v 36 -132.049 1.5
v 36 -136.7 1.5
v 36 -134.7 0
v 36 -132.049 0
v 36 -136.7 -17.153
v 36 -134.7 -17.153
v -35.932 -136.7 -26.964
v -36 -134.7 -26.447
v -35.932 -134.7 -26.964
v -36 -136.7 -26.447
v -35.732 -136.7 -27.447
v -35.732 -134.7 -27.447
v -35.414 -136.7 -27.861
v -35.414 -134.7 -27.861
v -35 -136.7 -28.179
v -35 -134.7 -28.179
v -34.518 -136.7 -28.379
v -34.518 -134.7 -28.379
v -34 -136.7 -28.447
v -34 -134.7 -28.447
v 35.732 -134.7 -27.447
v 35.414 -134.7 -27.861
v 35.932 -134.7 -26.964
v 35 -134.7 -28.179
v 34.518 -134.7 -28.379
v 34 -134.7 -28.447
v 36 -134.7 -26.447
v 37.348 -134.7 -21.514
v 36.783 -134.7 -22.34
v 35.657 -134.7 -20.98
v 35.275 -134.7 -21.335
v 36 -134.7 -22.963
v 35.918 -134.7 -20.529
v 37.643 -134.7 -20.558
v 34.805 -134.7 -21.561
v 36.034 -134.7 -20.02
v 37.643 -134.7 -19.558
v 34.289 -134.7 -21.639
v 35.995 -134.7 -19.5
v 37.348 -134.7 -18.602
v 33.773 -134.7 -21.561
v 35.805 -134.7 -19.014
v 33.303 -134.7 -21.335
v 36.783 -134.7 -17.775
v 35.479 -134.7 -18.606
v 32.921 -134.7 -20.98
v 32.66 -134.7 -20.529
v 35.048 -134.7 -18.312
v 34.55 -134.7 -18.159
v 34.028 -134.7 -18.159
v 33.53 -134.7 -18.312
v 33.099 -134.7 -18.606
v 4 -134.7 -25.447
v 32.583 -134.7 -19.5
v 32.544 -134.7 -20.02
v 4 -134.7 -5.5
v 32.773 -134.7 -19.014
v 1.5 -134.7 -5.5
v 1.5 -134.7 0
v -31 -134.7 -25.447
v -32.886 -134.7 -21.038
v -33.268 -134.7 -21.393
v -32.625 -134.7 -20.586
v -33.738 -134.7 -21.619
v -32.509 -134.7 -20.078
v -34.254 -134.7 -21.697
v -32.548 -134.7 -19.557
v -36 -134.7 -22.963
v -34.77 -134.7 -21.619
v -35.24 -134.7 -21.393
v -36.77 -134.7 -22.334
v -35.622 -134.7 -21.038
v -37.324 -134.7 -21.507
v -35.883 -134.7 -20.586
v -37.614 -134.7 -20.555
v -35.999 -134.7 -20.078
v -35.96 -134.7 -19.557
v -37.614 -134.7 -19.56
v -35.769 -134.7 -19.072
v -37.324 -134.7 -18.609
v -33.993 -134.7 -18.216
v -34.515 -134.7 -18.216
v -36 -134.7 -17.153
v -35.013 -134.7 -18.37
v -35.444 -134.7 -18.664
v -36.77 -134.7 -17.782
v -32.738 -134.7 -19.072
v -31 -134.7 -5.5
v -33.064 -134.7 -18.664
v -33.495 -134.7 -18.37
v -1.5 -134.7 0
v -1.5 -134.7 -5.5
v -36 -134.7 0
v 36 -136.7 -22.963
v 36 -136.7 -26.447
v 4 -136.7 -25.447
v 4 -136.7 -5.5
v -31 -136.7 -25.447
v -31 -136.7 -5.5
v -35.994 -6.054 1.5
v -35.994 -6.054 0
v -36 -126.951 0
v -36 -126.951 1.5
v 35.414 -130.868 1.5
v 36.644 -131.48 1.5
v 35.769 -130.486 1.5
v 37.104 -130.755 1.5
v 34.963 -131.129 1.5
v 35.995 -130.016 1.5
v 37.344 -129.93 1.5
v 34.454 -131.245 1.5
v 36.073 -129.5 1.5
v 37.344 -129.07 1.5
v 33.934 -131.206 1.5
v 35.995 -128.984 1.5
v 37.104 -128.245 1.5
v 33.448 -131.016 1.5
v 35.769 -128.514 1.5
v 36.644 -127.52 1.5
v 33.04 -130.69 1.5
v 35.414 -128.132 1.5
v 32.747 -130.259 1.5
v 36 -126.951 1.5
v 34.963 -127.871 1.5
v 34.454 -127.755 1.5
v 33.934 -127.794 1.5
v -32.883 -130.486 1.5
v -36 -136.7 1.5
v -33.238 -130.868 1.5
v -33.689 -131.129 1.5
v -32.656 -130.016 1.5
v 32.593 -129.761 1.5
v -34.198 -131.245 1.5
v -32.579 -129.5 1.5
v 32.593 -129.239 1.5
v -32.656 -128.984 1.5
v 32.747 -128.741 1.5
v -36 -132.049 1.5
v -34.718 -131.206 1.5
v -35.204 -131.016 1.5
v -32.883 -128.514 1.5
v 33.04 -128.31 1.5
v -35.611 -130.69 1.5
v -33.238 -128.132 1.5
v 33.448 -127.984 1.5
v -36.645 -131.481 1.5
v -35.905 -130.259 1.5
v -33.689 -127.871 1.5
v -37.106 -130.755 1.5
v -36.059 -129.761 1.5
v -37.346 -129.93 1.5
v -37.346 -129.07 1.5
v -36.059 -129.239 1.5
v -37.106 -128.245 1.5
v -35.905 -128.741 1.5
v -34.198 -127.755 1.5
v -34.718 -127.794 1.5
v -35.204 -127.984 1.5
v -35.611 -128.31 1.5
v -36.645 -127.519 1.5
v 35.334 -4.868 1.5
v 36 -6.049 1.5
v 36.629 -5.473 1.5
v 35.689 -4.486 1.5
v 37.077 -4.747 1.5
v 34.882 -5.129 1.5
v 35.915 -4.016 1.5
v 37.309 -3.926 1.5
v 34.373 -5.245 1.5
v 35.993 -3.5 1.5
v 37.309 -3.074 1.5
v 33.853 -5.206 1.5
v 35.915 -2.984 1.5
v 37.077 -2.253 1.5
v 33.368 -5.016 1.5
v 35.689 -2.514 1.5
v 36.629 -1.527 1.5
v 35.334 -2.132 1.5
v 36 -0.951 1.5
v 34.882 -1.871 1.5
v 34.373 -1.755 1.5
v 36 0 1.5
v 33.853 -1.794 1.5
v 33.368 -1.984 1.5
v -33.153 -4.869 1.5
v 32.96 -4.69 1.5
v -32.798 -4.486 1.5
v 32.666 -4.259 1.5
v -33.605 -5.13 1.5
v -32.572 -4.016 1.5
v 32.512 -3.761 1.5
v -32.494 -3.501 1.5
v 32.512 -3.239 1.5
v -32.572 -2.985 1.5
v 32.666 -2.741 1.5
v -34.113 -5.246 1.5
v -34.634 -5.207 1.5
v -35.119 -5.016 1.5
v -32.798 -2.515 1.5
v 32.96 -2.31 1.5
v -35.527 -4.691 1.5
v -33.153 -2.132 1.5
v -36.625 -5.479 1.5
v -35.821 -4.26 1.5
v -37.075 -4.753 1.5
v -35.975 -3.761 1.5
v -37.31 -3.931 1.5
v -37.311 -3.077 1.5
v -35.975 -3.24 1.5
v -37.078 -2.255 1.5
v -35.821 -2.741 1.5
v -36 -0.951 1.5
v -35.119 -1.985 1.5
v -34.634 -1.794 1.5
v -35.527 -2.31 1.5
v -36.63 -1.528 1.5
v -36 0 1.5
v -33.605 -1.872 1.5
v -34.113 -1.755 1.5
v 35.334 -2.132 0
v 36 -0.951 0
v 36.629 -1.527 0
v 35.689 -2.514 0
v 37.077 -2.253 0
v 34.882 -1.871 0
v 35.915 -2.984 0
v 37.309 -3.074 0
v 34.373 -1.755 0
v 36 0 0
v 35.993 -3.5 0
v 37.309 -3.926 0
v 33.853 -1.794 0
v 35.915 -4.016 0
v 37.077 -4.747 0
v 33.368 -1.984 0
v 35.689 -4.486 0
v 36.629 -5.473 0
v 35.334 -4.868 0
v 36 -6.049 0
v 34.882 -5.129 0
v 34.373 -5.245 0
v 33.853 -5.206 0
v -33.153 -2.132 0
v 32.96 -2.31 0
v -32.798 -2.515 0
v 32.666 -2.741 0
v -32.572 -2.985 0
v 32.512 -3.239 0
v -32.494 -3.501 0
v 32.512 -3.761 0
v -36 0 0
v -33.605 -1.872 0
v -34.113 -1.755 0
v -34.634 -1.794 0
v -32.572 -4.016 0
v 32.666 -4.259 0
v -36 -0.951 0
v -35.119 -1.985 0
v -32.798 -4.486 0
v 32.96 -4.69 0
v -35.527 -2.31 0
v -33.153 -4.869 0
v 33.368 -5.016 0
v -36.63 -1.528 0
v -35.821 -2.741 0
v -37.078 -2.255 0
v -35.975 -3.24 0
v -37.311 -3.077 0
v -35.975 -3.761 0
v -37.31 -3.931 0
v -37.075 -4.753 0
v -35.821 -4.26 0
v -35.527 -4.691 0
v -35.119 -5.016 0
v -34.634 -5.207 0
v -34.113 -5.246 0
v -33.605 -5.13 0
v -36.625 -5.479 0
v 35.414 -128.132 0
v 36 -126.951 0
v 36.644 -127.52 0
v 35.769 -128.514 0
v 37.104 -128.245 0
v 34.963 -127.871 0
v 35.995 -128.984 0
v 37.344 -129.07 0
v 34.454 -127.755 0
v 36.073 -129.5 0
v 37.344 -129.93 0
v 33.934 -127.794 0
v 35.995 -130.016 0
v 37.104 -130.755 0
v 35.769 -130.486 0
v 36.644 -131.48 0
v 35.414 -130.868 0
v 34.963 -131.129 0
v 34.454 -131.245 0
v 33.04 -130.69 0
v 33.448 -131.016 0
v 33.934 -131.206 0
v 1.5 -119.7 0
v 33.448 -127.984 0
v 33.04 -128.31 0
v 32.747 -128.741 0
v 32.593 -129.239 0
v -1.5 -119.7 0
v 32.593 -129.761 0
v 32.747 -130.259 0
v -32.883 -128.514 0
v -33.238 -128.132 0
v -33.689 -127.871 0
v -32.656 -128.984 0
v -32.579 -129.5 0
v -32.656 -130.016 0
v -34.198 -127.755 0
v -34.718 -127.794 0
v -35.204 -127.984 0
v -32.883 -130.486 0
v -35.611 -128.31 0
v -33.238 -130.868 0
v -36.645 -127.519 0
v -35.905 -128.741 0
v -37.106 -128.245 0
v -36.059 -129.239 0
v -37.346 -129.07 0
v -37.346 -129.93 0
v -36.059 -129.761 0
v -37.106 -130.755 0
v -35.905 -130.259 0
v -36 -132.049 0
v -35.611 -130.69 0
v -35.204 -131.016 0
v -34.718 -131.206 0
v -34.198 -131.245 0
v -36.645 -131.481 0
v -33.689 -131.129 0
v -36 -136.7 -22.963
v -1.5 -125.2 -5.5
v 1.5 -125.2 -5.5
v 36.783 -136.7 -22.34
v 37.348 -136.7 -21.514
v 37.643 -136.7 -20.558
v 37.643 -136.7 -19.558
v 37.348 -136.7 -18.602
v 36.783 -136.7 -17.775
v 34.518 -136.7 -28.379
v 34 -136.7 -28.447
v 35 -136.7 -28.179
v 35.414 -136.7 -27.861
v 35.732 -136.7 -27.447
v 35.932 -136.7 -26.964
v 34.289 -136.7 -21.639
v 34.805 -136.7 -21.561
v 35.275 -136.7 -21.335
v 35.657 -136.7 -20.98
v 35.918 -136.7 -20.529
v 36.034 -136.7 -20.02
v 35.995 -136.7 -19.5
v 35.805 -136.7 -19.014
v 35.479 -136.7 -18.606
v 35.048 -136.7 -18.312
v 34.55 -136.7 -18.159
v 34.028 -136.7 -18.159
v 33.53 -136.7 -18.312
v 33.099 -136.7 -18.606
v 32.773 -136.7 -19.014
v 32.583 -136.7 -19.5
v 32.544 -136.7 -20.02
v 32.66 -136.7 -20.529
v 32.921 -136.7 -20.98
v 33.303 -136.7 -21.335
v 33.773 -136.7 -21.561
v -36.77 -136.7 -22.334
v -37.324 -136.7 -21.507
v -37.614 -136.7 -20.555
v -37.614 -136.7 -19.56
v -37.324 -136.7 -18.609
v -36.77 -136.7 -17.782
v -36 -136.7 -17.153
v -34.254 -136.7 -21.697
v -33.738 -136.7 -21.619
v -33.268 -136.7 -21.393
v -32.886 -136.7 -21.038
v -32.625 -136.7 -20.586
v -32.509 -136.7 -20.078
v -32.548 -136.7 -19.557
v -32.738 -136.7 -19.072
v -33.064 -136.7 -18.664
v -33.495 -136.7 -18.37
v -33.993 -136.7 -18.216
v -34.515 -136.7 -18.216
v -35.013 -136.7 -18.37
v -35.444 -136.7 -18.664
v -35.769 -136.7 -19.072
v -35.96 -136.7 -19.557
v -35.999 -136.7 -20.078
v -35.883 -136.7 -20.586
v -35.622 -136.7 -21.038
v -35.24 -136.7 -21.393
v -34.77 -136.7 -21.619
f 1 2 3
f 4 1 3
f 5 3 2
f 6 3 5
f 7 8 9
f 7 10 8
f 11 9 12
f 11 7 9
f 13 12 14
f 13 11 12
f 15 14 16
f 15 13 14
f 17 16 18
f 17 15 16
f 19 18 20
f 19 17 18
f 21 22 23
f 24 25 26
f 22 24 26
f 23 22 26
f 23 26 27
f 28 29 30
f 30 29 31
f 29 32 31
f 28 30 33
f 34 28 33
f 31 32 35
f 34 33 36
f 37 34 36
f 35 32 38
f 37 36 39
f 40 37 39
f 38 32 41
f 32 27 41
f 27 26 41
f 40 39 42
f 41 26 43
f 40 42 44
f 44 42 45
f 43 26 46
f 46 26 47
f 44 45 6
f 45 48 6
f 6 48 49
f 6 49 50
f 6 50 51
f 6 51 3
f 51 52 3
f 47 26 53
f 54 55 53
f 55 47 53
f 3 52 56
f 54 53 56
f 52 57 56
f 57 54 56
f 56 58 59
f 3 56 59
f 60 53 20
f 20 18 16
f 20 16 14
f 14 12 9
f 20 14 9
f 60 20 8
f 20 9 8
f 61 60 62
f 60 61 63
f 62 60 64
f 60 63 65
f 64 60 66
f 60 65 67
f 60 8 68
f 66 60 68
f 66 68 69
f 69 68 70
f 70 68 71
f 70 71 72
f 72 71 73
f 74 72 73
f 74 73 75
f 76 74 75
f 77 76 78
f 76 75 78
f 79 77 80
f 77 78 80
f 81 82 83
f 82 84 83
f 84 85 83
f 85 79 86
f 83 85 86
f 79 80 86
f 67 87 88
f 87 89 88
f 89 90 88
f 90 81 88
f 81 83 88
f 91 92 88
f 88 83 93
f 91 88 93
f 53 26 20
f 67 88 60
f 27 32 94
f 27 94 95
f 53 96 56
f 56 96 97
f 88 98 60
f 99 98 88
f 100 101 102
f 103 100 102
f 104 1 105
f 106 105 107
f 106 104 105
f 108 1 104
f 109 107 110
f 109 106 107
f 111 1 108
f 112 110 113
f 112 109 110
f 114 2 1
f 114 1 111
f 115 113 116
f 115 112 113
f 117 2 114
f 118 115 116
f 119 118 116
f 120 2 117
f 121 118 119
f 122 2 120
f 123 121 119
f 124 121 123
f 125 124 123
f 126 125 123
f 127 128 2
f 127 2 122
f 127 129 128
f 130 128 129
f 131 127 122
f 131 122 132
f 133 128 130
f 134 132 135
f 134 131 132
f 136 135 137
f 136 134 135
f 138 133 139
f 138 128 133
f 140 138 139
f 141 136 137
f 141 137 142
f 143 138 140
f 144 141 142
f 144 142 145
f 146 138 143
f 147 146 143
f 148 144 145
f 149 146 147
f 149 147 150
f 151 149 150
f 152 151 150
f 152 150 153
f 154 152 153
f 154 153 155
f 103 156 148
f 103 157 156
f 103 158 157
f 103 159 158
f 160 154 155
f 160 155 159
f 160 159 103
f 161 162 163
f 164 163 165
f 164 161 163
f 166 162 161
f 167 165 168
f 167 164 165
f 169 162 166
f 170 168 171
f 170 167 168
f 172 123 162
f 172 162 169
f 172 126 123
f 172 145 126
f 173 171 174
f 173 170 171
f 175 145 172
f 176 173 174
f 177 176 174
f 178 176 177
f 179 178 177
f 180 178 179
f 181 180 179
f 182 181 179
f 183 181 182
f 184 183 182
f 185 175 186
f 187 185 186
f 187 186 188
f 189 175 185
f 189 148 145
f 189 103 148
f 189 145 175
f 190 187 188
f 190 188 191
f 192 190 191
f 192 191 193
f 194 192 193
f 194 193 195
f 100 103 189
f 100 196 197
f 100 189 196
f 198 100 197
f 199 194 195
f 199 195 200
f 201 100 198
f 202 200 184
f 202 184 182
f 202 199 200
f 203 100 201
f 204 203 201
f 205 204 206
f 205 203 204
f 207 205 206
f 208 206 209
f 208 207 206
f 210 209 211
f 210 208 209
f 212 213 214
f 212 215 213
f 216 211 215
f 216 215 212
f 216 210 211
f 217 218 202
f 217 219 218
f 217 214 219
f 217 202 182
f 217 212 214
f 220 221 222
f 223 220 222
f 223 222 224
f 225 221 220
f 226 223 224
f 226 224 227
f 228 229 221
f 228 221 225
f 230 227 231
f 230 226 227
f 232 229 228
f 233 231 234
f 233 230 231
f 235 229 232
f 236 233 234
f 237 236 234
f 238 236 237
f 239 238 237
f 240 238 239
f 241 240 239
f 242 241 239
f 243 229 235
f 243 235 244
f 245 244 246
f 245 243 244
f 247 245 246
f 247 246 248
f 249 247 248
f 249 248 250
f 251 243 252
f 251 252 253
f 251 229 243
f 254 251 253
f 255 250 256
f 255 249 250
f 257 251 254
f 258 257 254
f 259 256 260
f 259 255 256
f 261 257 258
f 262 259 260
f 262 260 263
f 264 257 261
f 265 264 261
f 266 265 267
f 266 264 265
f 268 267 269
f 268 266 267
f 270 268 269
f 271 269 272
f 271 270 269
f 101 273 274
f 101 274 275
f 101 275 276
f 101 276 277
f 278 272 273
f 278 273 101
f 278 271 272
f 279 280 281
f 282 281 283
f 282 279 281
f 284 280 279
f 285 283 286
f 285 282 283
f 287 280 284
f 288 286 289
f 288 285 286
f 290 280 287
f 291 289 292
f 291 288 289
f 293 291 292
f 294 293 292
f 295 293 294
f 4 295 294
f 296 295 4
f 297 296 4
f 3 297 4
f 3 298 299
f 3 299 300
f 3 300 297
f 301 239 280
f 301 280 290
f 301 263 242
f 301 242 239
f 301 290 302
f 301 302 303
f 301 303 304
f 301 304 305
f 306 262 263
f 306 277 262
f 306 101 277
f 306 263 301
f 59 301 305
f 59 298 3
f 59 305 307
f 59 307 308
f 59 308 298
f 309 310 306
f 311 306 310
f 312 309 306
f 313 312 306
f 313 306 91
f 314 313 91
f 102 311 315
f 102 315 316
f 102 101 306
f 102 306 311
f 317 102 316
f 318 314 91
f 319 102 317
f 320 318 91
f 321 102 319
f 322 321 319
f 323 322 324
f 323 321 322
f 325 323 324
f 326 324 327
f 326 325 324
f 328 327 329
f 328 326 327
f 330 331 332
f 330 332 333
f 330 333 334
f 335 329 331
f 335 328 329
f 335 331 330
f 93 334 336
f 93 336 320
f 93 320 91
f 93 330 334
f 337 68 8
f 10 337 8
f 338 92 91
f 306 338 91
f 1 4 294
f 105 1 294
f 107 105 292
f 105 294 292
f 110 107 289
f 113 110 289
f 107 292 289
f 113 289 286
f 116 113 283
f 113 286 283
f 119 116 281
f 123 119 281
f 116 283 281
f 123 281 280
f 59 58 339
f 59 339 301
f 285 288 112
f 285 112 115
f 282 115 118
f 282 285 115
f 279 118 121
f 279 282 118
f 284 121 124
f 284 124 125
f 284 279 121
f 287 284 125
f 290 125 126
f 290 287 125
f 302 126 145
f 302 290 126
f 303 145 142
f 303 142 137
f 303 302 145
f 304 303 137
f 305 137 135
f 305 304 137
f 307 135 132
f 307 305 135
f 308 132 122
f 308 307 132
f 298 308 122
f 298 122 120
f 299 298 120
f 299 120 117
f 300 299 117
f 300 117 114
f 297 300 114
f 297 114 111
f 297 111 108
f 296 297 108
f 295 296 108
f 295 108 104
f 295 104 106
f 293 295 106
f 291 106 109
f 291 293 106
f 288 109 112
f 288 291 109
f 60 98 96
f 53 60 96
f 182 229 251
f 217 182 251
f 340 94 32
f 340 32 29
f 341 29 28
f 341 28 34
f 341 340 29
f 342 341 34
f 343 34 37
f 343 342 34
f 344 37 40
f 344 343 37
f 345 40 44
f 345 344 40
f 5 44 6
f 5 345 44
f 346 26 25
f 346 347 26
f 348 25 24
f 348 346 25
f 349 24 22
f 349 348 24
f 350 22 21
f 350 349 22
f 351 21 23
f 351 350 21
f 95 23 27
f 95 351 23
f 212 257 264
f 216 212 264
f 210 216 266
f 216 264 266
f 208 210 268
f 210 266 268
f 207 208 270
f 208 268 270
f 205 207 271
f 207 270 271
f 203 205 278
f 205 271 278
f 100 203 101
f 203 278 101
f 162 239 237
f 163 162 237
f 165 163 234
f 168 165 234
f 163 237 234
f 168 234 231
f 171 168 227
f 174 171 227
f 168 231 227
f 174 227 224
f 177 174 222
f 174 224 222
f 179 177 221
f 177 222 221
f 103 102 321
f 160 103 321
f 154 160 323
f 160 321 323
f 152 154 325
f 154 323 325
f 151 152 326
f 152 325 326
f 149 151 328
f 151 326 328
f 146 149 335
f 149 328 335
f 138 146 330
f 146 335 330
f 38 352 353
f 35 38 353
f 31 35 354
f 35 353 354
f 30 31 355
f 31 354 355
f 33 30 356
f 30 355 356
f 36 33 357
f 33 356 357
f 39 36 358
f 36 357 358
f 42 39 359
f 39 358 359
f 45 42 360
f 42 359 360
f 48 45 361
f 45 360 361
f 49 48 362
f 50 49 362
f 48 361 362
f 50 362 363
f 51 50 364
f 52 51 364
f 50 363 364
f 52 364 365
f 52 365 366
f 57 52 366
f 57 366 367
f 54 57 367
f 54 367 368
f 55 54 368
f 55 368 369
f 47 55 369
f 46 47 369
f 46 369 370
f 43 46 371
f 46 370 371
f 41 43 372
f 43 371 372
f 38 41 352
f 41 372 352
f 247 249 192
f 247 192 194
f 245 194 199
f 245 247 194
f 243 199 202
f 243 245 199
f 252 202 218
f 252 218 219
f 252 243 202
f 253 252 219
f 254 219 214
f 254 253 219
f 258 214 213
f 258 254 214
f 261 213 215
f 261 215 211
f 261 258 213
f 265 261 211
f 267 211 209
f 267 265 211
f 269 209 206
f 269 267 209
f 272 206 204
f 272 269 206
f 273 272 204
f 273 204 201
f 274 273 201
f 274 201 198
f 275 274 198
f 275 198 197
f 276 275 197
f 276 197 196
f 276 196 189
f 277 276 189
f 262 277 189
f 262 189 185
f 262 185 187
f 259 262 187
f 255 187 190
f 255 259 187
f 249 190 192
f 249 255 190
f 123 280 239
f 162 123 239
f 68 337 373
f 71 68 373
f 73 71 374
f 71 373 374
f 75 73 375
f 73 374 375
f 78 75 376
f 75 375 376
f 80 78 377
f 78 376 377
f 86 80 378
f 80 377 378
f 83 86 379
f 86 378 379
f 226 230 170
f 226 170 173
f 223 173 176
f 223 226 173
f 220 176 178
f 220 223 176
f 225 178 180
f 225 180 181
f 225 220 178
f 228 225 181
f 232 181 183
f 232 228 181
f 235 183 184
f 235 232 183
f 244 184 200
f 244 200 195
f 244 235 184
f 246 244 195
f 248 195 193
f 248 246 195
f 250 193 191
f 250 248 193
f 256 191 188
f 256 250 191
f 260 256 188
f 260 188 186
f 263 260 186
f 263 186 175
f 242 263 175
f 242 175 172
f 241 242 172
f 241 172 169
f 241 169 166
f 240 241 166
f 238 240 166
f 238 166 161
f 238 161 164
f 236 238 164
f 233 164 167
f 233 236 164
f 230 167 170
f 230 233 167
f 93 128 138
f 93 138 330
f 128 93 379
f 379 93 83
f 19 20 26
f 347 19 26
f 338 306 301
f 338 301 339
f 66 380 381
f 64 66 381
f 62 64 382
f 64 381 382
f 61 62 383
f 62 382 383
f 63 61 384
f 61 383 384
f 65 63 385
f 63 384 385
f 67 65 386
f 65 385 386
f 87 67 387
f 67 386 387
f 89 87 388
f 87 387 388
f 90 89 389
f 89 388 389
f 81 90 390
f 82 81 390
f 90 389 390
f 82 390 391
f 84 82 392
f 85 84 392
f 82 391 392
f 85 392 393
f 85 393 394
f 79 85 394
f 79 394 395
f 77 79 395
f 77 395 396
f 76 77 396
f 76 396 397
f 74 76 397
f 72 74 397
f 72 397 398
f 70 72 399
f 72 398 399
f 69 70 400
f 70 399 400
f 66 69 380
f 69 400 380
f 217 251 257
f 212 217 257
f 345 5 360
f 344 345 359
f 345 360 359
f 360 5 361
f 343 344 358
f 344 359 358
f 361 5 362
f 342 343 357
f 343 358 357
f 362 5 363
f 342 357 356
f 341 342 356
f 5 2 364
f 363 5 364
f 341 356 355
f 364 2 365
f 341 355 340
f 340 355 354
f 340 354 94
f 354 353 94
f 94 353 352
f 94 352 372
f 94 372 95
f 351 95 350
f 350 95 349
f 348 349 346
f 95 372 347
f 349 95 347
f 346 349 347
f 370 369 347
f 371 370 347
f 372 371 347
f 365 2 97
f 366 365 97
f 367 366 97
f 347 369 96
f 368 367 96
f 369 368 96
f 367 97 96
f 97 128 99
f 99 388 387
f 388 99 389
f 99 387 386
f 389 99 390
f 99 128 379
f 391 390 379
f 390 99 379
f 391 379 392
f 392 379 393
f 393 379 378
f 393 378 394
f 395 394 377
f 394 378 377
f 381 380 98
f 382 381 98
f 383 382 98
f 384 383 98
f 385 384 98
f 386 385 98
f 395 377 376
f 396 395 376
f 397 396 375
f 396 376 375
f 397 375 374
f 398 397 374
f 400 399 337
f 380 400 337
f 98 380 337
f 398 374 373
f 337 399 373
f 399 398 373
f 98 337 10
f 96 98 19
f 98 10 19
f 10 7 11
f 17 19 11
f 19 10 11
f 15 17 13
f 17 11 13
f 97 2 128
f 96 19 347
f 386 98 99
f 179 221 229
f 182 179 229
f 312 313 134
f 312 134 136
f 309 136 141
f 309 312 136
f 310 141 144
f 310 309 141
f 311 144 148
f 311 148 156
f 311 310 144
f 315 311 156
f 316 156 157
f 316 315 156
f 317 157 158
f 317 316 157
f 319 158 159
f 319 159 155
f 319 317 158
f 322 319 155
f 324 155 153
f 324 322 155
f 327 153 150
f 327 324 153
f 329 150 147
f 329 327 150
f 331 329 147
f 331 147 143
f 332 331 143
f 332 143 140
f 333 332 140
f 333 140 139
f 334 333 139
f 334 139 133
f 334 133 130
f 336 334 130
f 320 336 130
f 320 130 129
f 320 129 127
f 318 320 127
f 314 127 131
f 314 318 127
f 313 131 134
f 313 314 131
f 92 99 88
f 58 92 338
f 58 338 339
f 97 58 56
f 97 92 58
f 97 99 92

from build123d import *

# Parameters (mm, degrees)
SKETCH1_R                = 1.75
BOSS_EXTRUDE1_DEPTH      = 1.5
BOSS_EXTRUDE2_DEPTH      = 72
BOSS_EXTRUDE3_DEPTH      = 1.5
BOSS_EXTRUDE3_DEPTH_BACK = 1.5
BOSS_EXTRUDE4_DEPTH      = 2
SKETCH5_R                = 1.75
CUT_EXTRUDE1_DEPTH       = 2
CUT_EXTRUDE2_DEPTH       = 148.332054879
CUT_EXTRUDE2_DEPTH_BACK  = 148.332054879
SKETCH6_W                = 72
SKETCH6_H                = 11.553195909
FILLET1_R                = 2
SKETCH8_W                = 35
SKETCH8_H                = 19.946804091
CUT_EXTRUDE3_DEPTH       = 22.4262221


with BuildPart() as part:
    # Sketch1 → Boss-Extrude1 (new body)
    with BuildSketch(Plane.XY):
        with BuildLine():
            Line((-31.5, -134.5), (31.5, -134.5))
            Line((31.5, -134.5), (36, -134.5))
            Line((36, -134.5), (36, -132.049019419))
            ThreePointArc((36, -132.049019419), (37.374296294, -129.5), (36, -126.950980581))
            Line((36, -126.950980581), (36, -6.049019419))
            ThreePointArc((36, -6.049019419), (37.33874188, -3.5), (36, -0.950980581))
            Line((36, -0.950980581), (36, 0))
            Line((36, 0), (-36, 0))
            Line((-36, 0), (-36, -0.950980581))
            ThreePointArc((-36, -0.950980581), (-37.339851511, -3.504206195), (-35.994020506, -6.054285021))
            Line((-35.994020506, -6.054285021), (-36, -126.950980581))
            ThreePointArc((-36, -126.950980581), (-37.376731289, -129.5), (-36, -132.049019419))
            Line((-36, -132.049019419), (-36, -134.5))
            Line((-36, -134.5), (-31.5, -134.5))
        make_face()
        with Locations((-34.328609587, -129.5)):
            Circle(SKETCH1_R, mode=Mode.SUBTRACT)
        with Locations((34.323211043, -129.5)):
            Circle(SKETCH1_R, mode=Mode.SUBTRACT)
        with Locations((34.242652207, -3.5)):
            Circle(SKETCH1_R, mode=Mode.SUBTRACT)
        with Locations((-34.244120111, -3.500578956)):
            Circle(SKETCH1_R, mode=Mode.SUBTRACT)
    extrude(amount=BOSS_EXTRUDE1_DEPTH)

    # Sketch2 → Boss-Extrude2 (add)
    with BuildSketch(Plane.ZY.offset(36)):
        Polygon((1.5, -134.5), (1.5, -136.7), (-40, -136.7), (-40, -134.7), (0, -134.7), (0, -134.5), (0, -132.049019419), (1.5, -132.049019419), align=None)
    extrude(amount=-BOSS_EXTRUDE2_DEPTH)

    # Sketch3 → Boss-Extrude3 (add, two sides: drawn at the far end of the back side and taken through both)
    with BuildSketch(Plane(origin=(0, 0, 0), x_dir=(0, 0, -1), z_dir=(1, 0, 0)).offset(-BOSS_EXTRUDE3_DEPTH_BACK)):
        Polygon((0, -119.7), (15, -134.7), (0, -134.7), align=None)
    extrude(amount=BOSS_EXTRUDE3_DEPTH + BOSS_EXTRUDE3_DEPTH_BACK)

    # Sketch4 → Boss-Extrude4 (add)
    with BuildSketch(Plane.XZ.offset(136.7)):
        with BuildLine():
            Line((-36, -17.152805247), (-36, -22.963011674))
            ThreePointArc((-36, -22.963011674), (-37.650416645, -20.05790846), (-36, -17.152805247))
        make_face()
        with BuildLine():
            Line((36, -17.152805247), (36, -22.963011674))
            ThreePointArc((36, -22.963011674), (37.68082264, -20.05790846), (36, -17.152805247))
        make_face()
    extrude(amount=-BOSS_EXTRUDE4_DEPTH)

    # Sketch5 → Cut-Extrude1 (cut)
    with BuildSketch(Plane.XZ.offset(136.7)):
        with Locations(Location((-34.253947115, -19.946804091, 0), (0, 0, 270))):
            Circle(SKETCH5_R)
        with Locations(Location((34.288977705, -19.889159472, 0), (0, 0, 270))):
            Circle(SKETCH5_R)
    extrude(amount=-CUT_EXTRUDE1_DEPTH, mode=Mode.SUBTRACT)

    # Sketch6 → Cut-Extrude2 (cut, two sides: drawn at the far end of the back side and taken through both)
    with BuildSketch(Plane.XZ.offset(136.7).offset(-CUT_EXTRUDE2_DEPTH_BACK)):
        with Locations((0, -34.223402046)):
            Rectangle(SKETCH6_W, SKETCH6_H)
    extrude(amount=CUT_EXTRUDE2_DEPTH + CUT_EXTRUDE2_DEPTH_BACK, mode=Mode.SUBTRACT)

    # Fillet1
    fillet1_edges = [part.edges().sort_by_distance(p)[0] for p in [
        (36, -135.7, -28.446804091),
        (-36, -135.7, -28.446804091),
    ]]
    fillet(fillet1_edges, radius=FILLET1_R)

    # Sketch8 → Cut-Extrude3 (cut)
    with BuildSketch(Plane.XZ.offset(136.7)):
        with Locations((-13.5, -15.473402046)):
            Rectangle(SKETCH8_W, SKETCH8_H)
    extrude(amount=-CUT_EXTRUDE3_DEPTH, mode=Mode.SUBTRACT)


solid = part.part
